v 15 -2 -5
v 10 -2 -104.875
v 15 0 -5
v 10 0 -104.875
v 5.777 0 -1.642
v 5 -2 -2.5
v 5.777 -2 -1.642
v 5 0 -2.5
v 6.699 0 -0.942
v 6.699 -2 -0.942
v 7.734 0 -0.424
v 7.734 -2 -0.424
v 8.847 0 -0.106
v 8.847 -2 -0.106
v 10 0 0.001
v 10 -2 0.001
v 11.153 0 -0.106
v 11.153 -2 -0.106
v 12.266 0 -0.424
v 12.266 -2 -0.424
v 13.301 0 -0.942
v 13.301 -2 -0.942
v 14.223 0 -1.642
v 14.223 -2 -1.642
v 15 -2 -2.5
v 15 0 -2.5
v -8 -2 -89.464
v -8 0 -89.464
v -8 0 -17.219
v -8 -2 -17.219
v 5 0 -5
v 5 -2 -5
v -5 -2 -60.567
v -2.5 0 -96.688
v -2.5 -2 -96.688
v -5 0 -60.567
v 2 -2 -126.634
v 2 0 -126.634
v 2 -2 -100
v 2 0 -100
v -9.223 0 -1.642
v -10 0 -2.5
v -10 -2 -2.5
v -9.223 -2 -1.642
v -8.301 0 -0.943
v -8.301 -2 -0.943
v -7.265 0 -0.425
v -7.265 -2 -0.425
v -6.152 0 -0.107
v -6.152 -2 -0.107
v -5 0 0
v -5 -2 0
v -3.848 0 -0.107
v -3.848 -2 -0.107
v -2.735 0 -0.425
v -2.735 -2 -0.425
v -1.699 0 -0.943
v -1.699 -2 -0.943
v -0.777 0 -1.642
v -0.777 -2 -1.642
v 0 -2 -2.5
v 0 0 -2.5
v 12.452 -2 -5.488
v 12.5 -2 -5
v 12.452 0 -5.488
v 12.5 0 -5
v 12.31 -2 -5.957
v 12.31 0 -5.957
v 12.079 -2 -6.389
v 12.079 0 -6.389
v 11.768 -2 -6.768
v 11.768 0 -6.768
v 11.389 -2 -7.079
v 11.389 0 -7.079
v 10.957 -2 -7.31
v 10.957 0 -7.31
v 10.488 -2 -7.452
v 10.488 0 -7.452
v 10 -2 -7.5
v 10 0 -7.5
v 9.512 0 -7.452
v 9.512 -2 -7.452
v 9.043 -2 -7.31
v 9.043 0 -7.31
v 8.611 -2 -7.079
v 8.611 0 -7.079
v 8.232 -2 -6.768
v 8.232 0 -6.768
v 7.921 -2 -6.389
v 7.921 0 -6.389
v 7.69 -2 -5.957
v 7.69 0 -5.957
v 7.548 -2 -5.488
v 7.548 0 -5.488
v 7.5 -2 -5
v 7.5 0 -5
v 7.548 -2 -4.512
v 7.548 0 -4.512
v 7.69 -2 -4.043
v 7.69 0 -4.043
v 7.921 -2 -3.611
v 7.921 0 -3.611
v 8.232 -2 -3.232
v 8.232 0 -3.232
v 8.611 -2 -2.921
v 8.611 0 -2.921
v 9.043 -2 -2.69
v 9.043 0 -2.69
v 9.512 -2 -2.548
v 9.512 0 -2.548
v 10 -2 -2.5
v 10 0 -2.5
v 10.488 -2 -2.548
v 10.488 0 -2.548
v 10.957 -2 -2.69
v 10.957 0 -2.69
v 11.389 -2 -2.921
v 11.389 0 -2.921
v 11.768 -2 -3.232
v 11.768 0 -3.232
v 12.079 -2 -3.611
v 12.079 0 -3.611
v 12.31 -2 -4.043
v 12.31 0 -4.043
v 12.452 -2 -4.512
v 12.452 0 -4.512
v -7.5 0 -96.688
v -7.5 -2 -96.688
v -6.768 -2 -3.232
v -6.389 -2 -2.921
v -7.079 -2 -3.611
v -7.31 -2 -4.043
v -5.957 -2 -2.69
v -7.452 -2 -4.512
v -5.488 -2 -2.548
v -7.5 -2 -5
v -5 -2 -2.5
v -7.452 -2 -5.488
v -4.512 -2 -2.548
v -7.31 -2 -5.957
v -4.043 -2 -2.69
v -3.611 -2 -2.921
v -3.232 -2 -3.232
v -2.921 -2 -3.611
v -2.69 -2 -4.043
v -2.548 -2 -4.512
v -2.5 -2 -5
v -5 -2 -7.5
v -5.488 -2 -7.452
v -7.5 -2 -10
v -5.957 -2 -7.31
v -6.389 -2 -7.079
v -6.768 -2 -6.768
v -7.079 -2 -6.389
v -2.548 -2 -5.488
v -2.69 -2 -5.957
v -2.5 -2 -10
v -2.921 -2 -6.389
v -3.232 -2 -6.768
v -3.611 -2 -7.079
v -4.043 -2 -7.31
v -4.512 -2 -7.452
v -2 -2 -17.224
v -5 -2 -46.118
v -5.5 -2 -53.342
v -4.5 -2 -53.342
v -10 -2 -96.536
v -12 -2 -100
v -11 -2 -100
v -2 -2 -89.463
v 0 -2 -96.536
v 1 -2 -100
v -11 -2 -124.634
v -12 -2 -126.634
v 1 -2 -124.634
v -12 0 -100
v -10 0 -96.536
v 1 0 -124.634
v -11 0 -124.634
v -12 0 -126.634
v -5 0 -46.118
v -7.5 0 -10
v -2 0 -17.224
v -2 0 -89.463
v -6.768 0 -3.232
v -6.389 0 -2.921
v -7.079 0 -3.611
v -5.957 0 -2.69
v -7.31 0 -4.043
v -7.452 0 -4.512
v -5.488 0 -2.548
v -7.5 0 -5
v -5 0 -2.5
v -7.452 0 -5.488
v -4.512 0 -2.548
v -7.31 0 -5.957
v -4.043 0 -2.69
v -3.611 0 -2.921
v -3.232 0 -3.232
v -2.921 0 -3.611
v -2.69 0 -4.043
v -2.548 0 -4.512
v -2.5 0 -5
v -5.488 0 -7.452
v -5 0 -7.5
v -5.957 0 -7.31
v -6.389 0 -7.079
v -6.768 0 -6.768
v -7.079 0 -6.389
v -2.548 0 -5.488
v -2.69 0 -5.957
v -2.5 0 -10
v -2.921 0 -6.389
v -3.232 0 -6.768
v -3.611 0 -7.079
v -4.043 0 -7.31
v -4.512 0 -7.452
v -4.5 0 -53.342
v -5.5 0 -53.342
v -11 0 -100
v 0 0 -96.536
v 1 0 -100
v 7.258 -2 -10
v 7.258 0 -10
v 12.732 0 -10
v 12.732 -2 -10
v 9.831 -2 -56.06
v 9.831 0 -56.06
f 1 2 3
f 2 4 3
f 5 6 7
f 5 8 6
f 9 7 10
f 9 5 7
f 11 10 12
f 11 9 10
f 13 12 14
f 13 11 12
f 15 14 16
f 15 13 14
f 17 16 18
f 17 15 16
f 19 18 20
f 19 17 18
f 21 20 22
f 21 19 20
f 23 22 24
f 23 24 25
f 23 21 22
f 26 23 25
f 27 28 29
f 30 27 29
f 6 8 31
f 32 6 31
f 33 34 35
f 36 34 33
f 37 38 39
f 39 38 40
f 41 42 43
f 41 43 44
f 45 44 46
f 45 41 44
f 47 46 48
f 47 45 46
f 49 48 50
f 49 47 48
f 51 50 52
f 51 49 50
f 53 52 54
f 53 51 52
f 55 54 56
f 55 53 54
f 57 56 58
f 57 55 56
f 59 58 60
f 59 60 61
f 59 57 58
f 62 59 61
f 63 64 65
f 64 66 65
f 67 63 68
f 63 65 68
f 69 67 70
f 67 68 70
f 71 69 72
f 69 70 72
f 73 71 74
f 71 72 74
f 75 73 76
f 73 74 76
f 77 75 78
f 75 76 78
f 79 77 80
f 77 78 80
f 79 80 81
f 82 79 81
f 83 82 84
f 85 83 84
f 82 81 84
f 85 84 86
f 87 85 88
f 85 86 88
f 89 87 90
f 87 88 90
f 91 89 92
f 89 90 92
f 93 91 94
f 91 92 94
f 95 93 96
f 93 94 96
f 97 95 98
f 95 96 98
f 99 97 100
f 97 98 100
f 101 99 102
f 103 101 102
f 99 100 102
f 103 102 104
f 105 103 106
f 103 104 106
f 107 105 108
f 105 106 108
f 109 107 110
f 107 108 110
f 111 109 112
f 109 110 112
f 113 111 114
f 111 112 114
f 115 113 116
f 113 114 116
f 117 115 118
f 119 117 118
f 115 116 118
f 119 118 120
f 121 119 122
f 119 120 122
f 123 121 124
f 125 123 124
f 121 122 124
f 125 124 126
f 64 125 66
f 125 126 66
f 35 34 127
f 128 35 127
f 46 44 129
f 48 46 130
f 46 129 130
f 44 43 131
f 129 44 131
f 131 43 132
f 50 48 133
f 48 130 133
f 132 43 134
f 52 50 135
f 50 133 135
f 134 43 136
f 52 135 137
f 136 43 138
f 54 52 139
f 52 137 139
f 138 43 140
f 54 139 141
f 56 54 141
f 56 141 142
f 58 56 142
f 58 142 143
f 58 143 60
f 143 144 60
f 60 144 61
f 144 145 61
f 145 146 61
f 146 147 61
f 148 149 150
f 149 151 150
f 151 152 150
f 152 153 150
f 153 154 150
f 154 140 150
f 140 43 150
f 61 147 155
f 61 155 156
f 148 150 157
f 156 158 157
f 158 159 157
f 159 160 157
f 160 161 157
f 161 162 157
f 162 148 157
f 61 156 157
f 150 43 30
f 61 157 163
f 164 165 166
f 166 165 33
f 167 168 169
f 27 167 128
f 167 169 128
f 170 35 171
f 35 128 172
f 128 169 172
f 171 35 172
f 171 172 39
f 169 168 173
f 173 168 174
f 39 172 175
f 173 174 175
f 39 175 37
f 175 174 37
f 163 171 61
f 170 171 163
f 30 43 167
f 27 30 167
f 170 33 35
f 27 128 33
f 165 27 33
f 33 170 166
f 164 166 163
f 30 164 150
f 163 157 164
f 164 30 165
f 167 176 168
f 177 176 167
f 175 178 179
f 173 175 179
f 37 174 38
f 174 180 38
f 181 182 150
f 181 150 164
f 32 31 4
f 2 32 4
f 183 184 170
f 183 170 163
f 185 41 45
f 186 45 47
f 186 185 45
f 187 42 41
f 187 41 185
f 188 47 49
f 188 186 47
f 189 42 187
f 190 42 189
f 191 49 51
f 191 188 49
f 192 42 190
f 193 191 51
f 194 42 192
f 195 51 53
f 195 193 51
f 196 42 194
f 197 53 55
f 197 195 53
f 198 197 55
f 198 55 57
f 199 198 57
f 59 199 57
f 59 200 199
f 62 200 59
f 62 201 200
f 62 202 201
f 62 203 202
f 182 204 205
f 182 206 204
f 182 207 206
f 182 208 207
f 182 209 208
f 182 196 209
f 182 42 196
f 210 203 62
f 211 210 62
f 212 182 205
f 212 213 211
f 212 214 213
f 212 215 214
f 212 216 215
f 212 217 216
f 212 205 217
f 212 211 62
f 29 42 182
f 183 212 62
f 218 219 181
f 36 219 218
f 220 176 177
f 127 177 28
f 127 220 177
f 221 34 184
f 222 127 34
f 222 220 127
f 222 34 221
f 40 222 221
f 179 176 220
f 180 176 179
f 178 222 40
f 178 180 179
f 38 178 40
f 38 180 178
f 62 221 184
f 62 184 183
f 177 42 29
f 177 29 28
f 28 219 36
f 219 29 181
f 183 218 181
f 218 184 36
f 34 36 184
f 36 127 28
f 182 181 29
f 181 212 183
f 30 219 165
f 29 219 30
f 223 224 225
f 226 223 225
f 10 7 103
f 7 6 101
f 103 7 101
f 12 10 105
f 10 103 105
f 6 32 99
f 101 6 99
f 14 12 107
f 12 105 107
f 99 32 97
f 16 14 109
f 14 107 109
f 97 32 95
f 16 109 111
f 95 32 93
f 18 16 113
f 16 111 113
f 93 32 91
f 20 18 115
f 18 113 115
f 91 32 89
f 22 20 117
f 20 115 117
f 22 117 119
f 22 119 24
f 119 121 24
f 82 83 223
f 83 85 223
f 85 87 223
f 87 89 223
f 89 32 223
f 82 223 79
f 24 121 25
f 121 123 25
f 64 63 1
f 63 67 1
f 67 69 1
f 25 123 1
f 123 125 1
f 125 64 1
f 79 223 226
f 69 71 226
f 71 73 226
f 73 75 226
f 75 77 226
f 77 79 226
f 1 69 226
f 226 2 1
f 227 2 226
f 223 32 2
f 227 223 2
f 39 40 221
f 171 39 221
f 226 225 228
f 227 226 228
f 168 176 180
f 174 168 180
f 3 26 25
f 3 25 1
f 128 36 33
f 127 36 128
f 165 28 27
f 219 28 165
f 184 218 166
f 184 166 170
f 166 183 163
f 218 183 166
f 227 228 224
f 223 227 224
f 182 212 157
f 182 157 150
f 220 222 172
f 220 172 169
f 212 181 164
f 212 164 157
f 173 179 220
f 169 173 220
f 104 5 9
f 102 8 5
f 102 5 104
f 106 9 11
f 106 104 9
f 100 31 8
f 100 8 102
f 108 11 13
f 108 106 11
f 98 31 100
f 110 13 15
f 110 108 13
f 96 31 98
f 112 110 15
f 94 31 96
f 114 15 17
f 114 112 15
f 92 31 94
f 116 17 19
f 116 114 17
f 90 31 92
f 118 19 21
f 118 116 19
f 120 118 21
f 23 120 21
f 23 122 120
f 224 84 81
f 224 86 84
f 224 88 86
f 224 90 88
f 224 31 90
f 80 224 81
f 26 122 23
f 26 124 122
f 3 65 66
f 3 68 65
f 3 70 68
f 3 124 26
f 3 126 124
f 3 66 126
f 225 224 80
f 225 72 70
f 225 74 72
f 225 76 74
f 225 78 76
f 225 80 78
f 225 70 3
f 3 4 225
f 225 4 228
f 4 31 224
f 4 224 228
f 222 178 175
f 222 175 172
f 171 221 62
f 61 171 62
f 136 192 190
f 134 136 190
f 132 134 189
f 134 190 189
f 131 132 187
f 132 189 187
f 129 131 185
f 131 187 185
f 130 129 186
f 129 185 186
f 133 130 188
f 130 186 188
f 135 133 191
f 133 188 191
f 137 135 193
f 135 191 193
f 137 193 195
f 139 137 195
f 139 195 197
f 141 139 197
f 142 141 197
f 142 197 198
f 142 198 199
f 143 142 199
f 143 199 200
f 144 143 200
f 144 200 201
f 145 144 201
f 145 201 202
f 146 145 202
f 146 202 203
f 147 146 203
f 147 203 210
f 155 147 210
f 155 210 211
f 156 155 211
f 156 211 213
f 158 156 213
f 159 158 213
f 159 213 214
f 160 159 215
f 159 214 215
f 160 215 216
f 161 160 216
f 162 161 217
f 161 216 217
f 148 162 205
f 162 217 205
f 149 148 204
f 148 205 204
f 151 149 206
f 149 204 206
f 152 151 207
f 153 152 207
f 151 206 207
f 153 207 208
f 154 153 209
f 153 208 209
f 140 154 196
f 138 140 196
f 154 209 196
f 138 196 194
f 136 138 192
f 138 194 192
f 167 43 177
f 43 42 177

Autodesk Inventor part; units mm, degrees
ref_plane "YZ Plane" through (0, 0, 0) normal (1, 0, 0) x (0, 1, 0)
ref_plane "XZ Plane" through (0, 0, 0) normal (0, 1, 0) x (-1, 0, 0)
ref_plane "XY Plane" through (0, 0, 0) normal (0, 0, 1) x (1, 0, 0)
sketch "Szkic3" plane through (0, 0, 0) normal (0, 1, 0) x (-1, 0, 0)
  line L0 (0, 0) -> (10, 0)
  line L1 (10, 0) -> (10, -50)
  line L2 (10, -50) -> (0, -50)
  line L3 (0, -50) -> (0, 0)
  circle A0 centre (5, -5) radius 2.5
  arc A1 (10, -2.5) -> (0, -2.5) centre (5, -6.25) ccw
  line L4 (8, -50) -> (2, -50)
  line L5 (2, -50) -> (2, -10)
  line L6 (2, -10) -> (8, -10)
  line L7 (8, -10) -> (8, -50)
  line L8 (2, -10) -> (8, -16)
  line L9 (2, -10) -> (10.4853, -10) construction
  line L10 (8, -16) -> (8, -18)
  line L11 (8, -18) -> (2, -12)
  line L12 (2, -10) -> (2, -12)
  line L13 (8, -18) -> (8, -22)
  line L14 (2, -16) -> (8, -22)
  line L15 (8, -24) -> (2, -18)
  line L16 (8, -16) -> (8, -14)
  line L17 (8, -24) -> (8, -26)
  line L18 (2, -20) -> (8, -26)
  line L19 (8, -28) -> (2, -22)
  line L20 (8, -28) -> (8, -32)
  line L21 (2, -26) -> (8, -32)
  line L22 (8, -34) -> (2, -28)
  line L23 (8, -34) -> (8, -36)
  line L24 (2, -26) -> (8, -32)
  line L25 (8, -34) -> (2, -28)
  line L26 (8, -34) -> (8, -38)
  line L27 (2, -32) -> (8, -38)
  line L28 (8, -40) -> (2, -34)
  line L29 (8, -40) -> (8, -42)
  line L30 (2, -32) -> (8, -38)
  line L31 (8, -40) -> (2, -34)
  line L32 (8, -40) -> (8, -44)
  line L33 (2, -38) -> (8, -44)
  line L34 (8, -46) -> (2, -40)
  line L35 (8, -46) -> (8, -48)
  line L36 (2, -38) -> (8, -44)
  line L37 (8, -46) -> (2, -40)
  line L38 (8, -46) -> (8, -50)
  line L39 (8, -46) -> (8, -48)
  line L40 (8, -48) -> (2, -42)
  line L41 (2, -42) -> (2, -44)
  line L42 (2, -44) -> (8, -50)
  line L43 (7, -49) -> (2, -49)
  circle A2 centre (5, -5) radius 3.25
  dimension "d9" = 10
  dimension "d10" = 50
  dimension "d11" = 5
  dimension "d12" = 6
  dimension "d13" = 40
  dimension "d14" = 45
  dimension "d15" = 2
  dimension "d16" = 4
  dimension "d17" = 2
  dimension "d18" = 2
  dimension "d19" = 2
  dimension "d20" = 2
  dimension "d21" = 4
  dimension "d22" = 2
  dimension "d23" = 2
  dimension "d24" = 2
  dimension "d25" = 4
  dimension "d26" = 2
  dimension "d27" = 2
  dimension "d28" = 2
  dimension "d29" = 4
  dimension "d30" = 2
  dimension "d32" = 2
  dimension "d36" = 2
  dimension "d37" = 2
  dimension "d42" = 6.5
extrude "Wyciągnięcie proste2" add sketch "Szkic3" against normal blind 2 contours A1 L1 L2 L7 L6 L5 L3 | L5 L43 L42 L2 | L42 L5 L40 L7 | L34 L5 L33 L7 | L28 L5 L27 L7 | L5 L21 L7 L22 | L5 L18 L7 L19 | L5 L14 L7 L15 | L5 L8 L7 L11 | A2
ref_plane "Płaszczyzna konstrukcyjna1" through (0, 0, -50) normal (0, 0, -1) x (-1, 0, 0)
mirror "Odbij1" about plane through (0, 0, -50) normal (0, 0, -1) of "Wyciągnięcie proste2"
sketch "Szkic4" plane through (0, 0, 0) normal (0, 1, 0) x (1, 0, 0)
  line L0 (-7.5, 91.0504) -> (-2.5, 91.0504)
  line L1 (-2.5, 91.0504) -> (-2.5, 98.6571)
  line L2 (-2.5, 98.6571) -> (-7.5, 98.6571)
  line L3 (-7.5, 98.6571) -> (-7.5, 91.0504)
  point P0 (0, 0)
extrude "Wyciągnięcie proste3" cut sketch "Szkic4" against normal blind 2
sketch "Szkic5" plane through (0, 0, 0) normal (0, 1, 0) x (1, 0, 0)
  line L0 (-10, 2.5) -> (-10, 97.5) projected
  line L1 (-10, 97.5) -> (-10, 67.5)
  line L2 (-10, 67.5) -> (-13, 67.5)
  line L3 (-13, 67.5) -> (-13, 97.5)
  line L4 (-13, 97.5) -> (-10, 97.5)
  arc A0 (0, 97.5) -> (-10, 97.5) centre (-5, 93.75) ccw projected
  line L5 (-5, 100) -> (-5, 49.8742)
  line L6 (-5, 100) -> (45.1258, 100) construction
  line L7 (-13, 67.5) -> (-10, 62.3038)
  line L8 (-13, 67.5) -> (-7, 67.5) construction
  line L9 (-10, 62.3038) -> (-10, 67.5)
  line L10 (0, 2.5) -> (0, 97.5)
  line L11 (0, 67.5) -> (3, 67.5)
  line L12 (3, 67.5) -> (3, 97.5)
  line L13 (3, 97.5) -> (0, 97.5)
  line L14 (3, 67.5) -> (0, 62.3038)
  arc A1 (3, 97.5) -> (-13, 97.5) centre (-5, 94.4495) ccw
  point P0 (0, 0)
  dimension "d43" = 30
  dimension "d44" = 3
  dimension "d45" = 90
  dimension "d46" = 60
extrude "Wyciągnięcie proste4" add sketch "Szkic5" against normal blind 2
sketch "Szkic6" plane through (0, 0, 0) normal (0, 1, 0) x (1, 0, 0)
  line L0 (-10, 62.3038) -> (-10, 2.5) projected
  line L1 (-10, 62.3038) -> (-10, 97.356)
  line L2 (-10, 97.356) -> (0, 97.356)
  line L3 (0, 97.356) -> (0, 62.3038)
  line L4 (0, 62.3038) -> (-10, 62.3038)
  point P0 (0, 0)
extrude "Wyciągnięcie proste5" cut sketch "Szkic6" against normal blind 2
sketch "Szkic7" plane through (0, 0, 0) normal (0, 1, 0) x (1, 0, 0)
  line L0 (-10, 62.3038) -> (-8, 62.3038) projected
  line L1 (-10, 62.3038) -> (-10, 67.4287)
  line L2 (-10, 62.3038) -> (-10, 97.356) projected
  line L3 (-10, 67.4287) -> (0, 67.4287)
  line L4 (0, 62.3038) -> (0, 97.356) projected
  line L5 (0, 62.3038) -> (0, 67.4287)
  line L6 (0, 62.3038) -> (-2, 62.3038) projected
  line L7 (-10, 2.5) -> (-10, 62.3038) projected
  line L8 (0, 62.3038) -> (-10, 62.3038)
  line L9 (-10, 62.3038) -> (-10, 61.2351)
  line L10 (-10, 61.2351) -> (0, 61.2351)
  line L11 (0, 61.2351) -> (0, 62.3038)
  line L12 (-10, 61.2351) -> (0, 61.2351)
  line L13 (0, 2.5) -> (0, 62.3038) projected
  line L14 (0, 61.2351) -> (0, 67.4287)
  line L15 (0, 67.4287) -> (-10, 67.4287)
  line L16 (-10, 61.2351) -> (-10, 67.4287)
  point P0 (0, 0)
extrude "Wyciągnięcie proste6" add sketch "Szkic7" against normal blind 2
sketch "Szkic8" plane through (0, 0, 0) normal (0, 1, 0) x (1, 0, 0)
  line L0 (-7.5, 97.356) -> (-10, 97.356) projected
  line L1 (-10, 97.356) -> (-11, 97.356)
  line L2 (-11, 97.356) -> (-11, 67.4287)
  line L3 (-11, 67.4287) -> (-10, 67.4287)
  line L4 (-10, 67.4287) -> (-10, 97.356)
  line L5 (0, 97.356) -> (1, 97.356)
  line L6 (1, 97.356) -> (1, 67.4287)
  line L7 (1, 67.4287) -> (0, 67.4287)
  line L8 (0, 67.4287) -> (0, 97.356)
  line L9 (-11, 67.4287) -> (1, 67.4287)
  line L10 (1, 67.4287) -> (1, 72.7222)
  line L11 (1, 72.7222) -> (-11, 72.7222)
  line L12 (-11, 72.7222) -> (-11, 67.4287)
  point P0 (0, 0)
  point P1 (0, 72.7222)
  point P2 (-10, 72.7222)
  dimension "d53" = 1
  dimension "d54" = 1
extrude "Wyciągnięcie proste7" cut sketch "Szkic8" against normal blind 2 contours L4 L11 L2 L1 | L8 L5 L6 L11
sketch "Szkic9" plane through (0, 0, 0) normal (0, 1, 0) x (1, 0, 0)
  line L0 (-10, 72.7222) -> (0, 72.7222)
  line L1 (0, 72.7222) -> (0, 67.3617)
  line L2 (0, 67.3617) -> (-10, 67.3617)
  line L3 (-10, 67.3617) -> (-10, 72.7222)
  point P0 (0, 0)
extrude "Wyciągnięcie proste8" add sketch "Szkic9" against normal blind 2
sketch "Szkic10" plane through (0, 0, 0) normal (0, 1, 0) x (1, 0, 0)
  point P0 (0, 0)
split "Podział1" plane through (0, 0, -50) removes the side toward (0, 0, -1)
sketch "Szkic11" plane through (0, 0, 0) normal (0, 1, 0) x (1, 0, 0)
  line L0 (-10, 2.5) -> (-10, 50) projected
  line L1 (-10, 50) -> (0, 50)
  line L2 (0, 50) -> (0, 100)
  line L3 (0, 100) -> (-10, 100)
  line L4 (-10, 100) -> (-10, 50)
  line L5 (-10, 100) -> (0, 100)
  line L6 (0, 100) -> (0, 124.634)
  line L7 (0, 124.634) -> (-10, 124.634)
  line L8 (-10, 124.634) -> (-10, 100)
  line L9 (-10, 124.634) -> (-11, 124.634)
  line L10 (-11, 124.634) -> (-11, 100)
  line L11 (-11, 100) -> (-10, 100)
  line L12 (-10, 100) -> (-10, 124.634)
  line L13 (0, 124.634) -> (1, 124.634)
  line L14 (1, 124.634) -> (1, 100)
  line L15 (1, 100) -> (0, 100)
  line L16 (0, 100) -> (0, 124.634)
  line L17 (-11, 100) -> (-9, 100) construction
  line L18 (1, 100) -> (3, 100) construction
  line L19 (-11, 124.634) -> (1, 124.634)
  line L20 (1, 124.634) -> (1, 126.634)
  line L21 (1, 126.634) -> (-11, 126.634)
  line L22 (-11, 126.634) -> (-11, 124.634)
  line L23 (-11, 100) -> (-12, 100)
  line L24 (-12, 100) -> (-12, 126.634)
  line L25 (-12, 126.634) -> (-11, 126.634)
  line L26 (-11, 126.634) -> (-11, 100)
  line L27 (1, 126.634) -> (2, 126.634)
  line L28 (2, 126.634) -> (2, 100)
  line L29 (2, 100) -> (1, 100)
  line L30 (1, 100) -> (1, 126.634)
  line L31 (-12, 100) -> (-10, 96.5359)
  line L32 (-12, 100) -> (-8, 100) construction
  line L33 (2, 100) -> (0, 96.5359)
  line L34 (2, 100) -> (6, 100) construction
  line L35 (-10, 124.634) -> (-10.5, 124.634)
  line L36 (-10.5, 124.634) -> (-10.5, 100)
  line L37 (0.5, 100) -> (0.5, 124.634)
  line L38 (0.75, 100) -> (0.75, 124.634)
  line L39 (-11, 100) -> (-10.75, 100)
  line L40 (-10.75, 100) -> (-10.75, 124.634)
  point P0 (0, 0)
  dimension "d59" = 10
  dimension "d60" = 50
  dimension "d61" = 10
  dimension "d62" = 24.634
  dimension "d63" = 1
  dimension "d64" = 1
  dimension "d67" = 2
  dimension "d68" = 1
  dimension "d69" = 1
  dimension "d70" = 60
  dimension "d71" = 120
  dimension "d90" = 0.5
  dimension "d107" = 0.25
extrude "Wyciągnięcie proste9" add sketch "Szkic11" against normal blind 2 contours L4 L3 L2 L1 | L31 L23 L11 L4 | L2 L15 L29 L33 | L24 L25 L22 L10 L23 | L29 L14 L20 L27 L28 | L9 L22 L21 L20 L13 L7
sketch "Szkic12" plane through (0, 0, 0) normal (0, 1, 0) x (1, 0, 0)
  line L0 (-8, 51.0298) -> (-2, 51.0298)
  line L1 (-2, 51.0298) -> (-2, 96.6875)
  line L2 (-2, 96.6875) -> (-8, 96.6875)
  line L3 (-8, 96.6875) -> (-8, 51.0298)
  line L4 (-8, 51.0298) -> (-2, 54.4939)
  line L5 (-8, 51.0298) -> (-1.0718, 51.0298) construction
  line L6 (-2, 54.4939) -> (-2, 59.4939)
  line L7 (-2, 59.4939) -> (-8, 56.0298)
  line L8 (-8, 51.0298) -> (-8, 56.0298)
  line L9 (-8, 56.0298) -> (-8, 61.0298)
  line L10 (-8, 61.0298) -> (-2, 64.4939)
  line L11 (-2, 64.4939) -> (-2, 69.4939)
  line L12 (-2, 69.4939) -> (-8, 66.0298)
  line L13 (-8, 61.0298) -> (-8, 66.0298)
  line L14 (-8, 66.0298) -> (-2, 69.4939)
  line L15 (-2, 74.4939) -> (-8, 71.0298)
  line L16 (-8, 76.0298) -> (-2, 79.4939)
  line L17 (-2, 84.4939) -> (-8, 81.0298)
  line L18 (-8, 71.0298) -> (-2, 74.4939)
  line L19 (-2, 79.4939) -> (-8, 76.0298)
  line L20 (-8, 81.0298) -> (-2, 84.4939)
  line L21 (-2, 89.4939) -> (-8, 86.0298)
  line L22 (-8, 76.0298) -> (-2, 79.4939)
  line L23 (-2, 84.4939) -> (-8, 81.0298)
  line L24 (-8, 86.0298) -> (-2, 89.4939)
  line L25 (-2, 94.4939) -> (-8, 91.0298)
  point P0 (0, 0)
  dimension "d74" = 30
  dimension "d75" = 5
  dimension "d76" = 5
  dimension "d77" = 5
  dimension "d78" = 5
  dimension "d79" = 5
  dimension "d80" = 5
  dimension "d81" = 5
  dimension "d82" = 5
  dimension "d83" = 5
  dimension "d84" = 5
  dimension "d85" = 5
  dimension "d86" = 5
extrude "Wyciągnięcie proste10" cut sketch "Szkic12" against normal blind 2 contours L3 L7 L1 L4 | L3 L12 L1 L10 | L3 L16 L1 L15 | L3 L21 L1 L17 | L3 L2 L1 L25
sketch "Szkic14" plane through (0, 0, 0) normal (0, 1, 0) x (1, 0, 0)
  arc A0 (5, 2.5) -> (15, 2.5) centre (10, 6.2465) ccw
  circle A1 centre (10, 5) radius 2.5
  line L0 (5, 2.5) -> (5, 5)
  line L1 (15, 2.5) -> (15, 5)
  line L2 (5, 5) -> (10, 104.8749)
  line L3 (10, 104.8749) -> (15, 5)
  line L4 (5.1827, 8.65) -> (14.8173, 8.65)
  line L5 (6.9979, 8.65) -> (12.6647, 8.65) construction
  line L6 (5.1827, 8.65) -> (7.1827, 8.65)
  line L7 (14.8173, 8.65) -> (12.8173, 8.65)
  line L8 (12.8173, 8.65) -> (9.8313, 56.0603)
  line L9 (9.8313, 56.0603) -> (7.1827, 8.65)
  line L10 (7.2581, 10) -> (12.7322, 10)
  point P0 (0, 0)
  dimension "d91" = 10
  dimension "d92" = 5
  dimension "d93" = 100
  dimension "d103" = 2
  dimension "d104" = 2
extrude "Wyciągnięcie proste11" add sketch "Szkic14" against normal blind 2 contours L0 L2 L4 L3 L1 A0 | L2 L3 L4 L8 L9 | L9 L10 L8 L4
sketch "Szkic15" plane through (0, 0, 0) normal (0, 1, 0) x (1, 0, 0)
  line L0 (-8, 91.0298) -> (-8, 96.6875) projected
  line L1 (-2, 10) -> (-8, 10) projected
  line L2 (-8, 96.6875) -> (-2, 96.6875)
  line L3 (-2, 96.6875) -> (-2, 10)
  line L4 (-2, 10) -> (-8, 10)
  line L5 (-8, 10) -> (-8, 96.6875)
  point P0 (0, 0)
extrude "Wyciągnięcie proste12" cut sketch "Szkic15" against normal blind 2
sketch "Szkic17" plane through (0, 0, 0) normal (0, 1, 0) x (1, 0, 0)
  line L0 (-2, 96.6875) -> (-8, 96.6875) projected
  line L1 (-8, 96.6875) -> (-8.5, 96.6875)
  line L2 (-8.5, 96.6875) -> (-7.5, 96.6875)
  line L3 (-2, 96.6875) -> (-2.5, 96.6875)
  line L4 (-2.5, 96.6875) -> (-1.5, 96.6875)
  line L5 (-8, 9.9943) -> (-8.5, 9.9943)
  line L6 (-8.5, 9.9943) -> (-7.5, 9.9943)
  line L7 (-2, 10) -> (-8, 10) projected
  line L8 (-2, 10) -> (-1.5, 10)
  line L9 (-1.5, 10) -> (-2.5, 10)
  line L10 (-1.5, 10) -> (-7.5, 96.6875)
  line L11 (-8.5, 96.6875) -> (-2.5, 10)
  line L12 (-7.5, 9.9943) -> (-1.5, 96.6875)
  line L13 (-2.5, 96.6875) -> (-8.5, 9.9943)
  point P0 (0, 0)
  point P1 (-4.9999, 60.5665)
  point P2 (-5.4999, 53.3423)
  point P3 (-4.9999, 46.1181)
  point P4 (-4.4999, 53.3423)
  dimension "d121" = 0.5
  dimension "d122" = 1
  dimension "d123" = 0.5
  dimension "d124" = 1
  dimension "d125" = 0.5
  dimension "d126" = 1
  dimension "d127" = 0.5
  dimension "d128" = 1
extrude "Wyciągnięcie proste14" add sketch "Szkic17" against normal blind 2 contours L4 L12 L10 L13 L0 | L10 L13 L11 L1 L0 | L10 L12 L11 L13 | L10 L8 L7 L11 L12 | L11 L12 L6 L5 L13
ref_plane "Płaszczyzna konstrukcyjna5" through (3.75, 0, -2.5) normal (-1, 0, 0) x (0, -1, 0)
ref_plane "Płaszczyzna konstrukcyjna4" through (0, 0, -2.5) normal (-1, 0, 0) x (0, -1, 0)
properties part number "arm_v1(backup)"
